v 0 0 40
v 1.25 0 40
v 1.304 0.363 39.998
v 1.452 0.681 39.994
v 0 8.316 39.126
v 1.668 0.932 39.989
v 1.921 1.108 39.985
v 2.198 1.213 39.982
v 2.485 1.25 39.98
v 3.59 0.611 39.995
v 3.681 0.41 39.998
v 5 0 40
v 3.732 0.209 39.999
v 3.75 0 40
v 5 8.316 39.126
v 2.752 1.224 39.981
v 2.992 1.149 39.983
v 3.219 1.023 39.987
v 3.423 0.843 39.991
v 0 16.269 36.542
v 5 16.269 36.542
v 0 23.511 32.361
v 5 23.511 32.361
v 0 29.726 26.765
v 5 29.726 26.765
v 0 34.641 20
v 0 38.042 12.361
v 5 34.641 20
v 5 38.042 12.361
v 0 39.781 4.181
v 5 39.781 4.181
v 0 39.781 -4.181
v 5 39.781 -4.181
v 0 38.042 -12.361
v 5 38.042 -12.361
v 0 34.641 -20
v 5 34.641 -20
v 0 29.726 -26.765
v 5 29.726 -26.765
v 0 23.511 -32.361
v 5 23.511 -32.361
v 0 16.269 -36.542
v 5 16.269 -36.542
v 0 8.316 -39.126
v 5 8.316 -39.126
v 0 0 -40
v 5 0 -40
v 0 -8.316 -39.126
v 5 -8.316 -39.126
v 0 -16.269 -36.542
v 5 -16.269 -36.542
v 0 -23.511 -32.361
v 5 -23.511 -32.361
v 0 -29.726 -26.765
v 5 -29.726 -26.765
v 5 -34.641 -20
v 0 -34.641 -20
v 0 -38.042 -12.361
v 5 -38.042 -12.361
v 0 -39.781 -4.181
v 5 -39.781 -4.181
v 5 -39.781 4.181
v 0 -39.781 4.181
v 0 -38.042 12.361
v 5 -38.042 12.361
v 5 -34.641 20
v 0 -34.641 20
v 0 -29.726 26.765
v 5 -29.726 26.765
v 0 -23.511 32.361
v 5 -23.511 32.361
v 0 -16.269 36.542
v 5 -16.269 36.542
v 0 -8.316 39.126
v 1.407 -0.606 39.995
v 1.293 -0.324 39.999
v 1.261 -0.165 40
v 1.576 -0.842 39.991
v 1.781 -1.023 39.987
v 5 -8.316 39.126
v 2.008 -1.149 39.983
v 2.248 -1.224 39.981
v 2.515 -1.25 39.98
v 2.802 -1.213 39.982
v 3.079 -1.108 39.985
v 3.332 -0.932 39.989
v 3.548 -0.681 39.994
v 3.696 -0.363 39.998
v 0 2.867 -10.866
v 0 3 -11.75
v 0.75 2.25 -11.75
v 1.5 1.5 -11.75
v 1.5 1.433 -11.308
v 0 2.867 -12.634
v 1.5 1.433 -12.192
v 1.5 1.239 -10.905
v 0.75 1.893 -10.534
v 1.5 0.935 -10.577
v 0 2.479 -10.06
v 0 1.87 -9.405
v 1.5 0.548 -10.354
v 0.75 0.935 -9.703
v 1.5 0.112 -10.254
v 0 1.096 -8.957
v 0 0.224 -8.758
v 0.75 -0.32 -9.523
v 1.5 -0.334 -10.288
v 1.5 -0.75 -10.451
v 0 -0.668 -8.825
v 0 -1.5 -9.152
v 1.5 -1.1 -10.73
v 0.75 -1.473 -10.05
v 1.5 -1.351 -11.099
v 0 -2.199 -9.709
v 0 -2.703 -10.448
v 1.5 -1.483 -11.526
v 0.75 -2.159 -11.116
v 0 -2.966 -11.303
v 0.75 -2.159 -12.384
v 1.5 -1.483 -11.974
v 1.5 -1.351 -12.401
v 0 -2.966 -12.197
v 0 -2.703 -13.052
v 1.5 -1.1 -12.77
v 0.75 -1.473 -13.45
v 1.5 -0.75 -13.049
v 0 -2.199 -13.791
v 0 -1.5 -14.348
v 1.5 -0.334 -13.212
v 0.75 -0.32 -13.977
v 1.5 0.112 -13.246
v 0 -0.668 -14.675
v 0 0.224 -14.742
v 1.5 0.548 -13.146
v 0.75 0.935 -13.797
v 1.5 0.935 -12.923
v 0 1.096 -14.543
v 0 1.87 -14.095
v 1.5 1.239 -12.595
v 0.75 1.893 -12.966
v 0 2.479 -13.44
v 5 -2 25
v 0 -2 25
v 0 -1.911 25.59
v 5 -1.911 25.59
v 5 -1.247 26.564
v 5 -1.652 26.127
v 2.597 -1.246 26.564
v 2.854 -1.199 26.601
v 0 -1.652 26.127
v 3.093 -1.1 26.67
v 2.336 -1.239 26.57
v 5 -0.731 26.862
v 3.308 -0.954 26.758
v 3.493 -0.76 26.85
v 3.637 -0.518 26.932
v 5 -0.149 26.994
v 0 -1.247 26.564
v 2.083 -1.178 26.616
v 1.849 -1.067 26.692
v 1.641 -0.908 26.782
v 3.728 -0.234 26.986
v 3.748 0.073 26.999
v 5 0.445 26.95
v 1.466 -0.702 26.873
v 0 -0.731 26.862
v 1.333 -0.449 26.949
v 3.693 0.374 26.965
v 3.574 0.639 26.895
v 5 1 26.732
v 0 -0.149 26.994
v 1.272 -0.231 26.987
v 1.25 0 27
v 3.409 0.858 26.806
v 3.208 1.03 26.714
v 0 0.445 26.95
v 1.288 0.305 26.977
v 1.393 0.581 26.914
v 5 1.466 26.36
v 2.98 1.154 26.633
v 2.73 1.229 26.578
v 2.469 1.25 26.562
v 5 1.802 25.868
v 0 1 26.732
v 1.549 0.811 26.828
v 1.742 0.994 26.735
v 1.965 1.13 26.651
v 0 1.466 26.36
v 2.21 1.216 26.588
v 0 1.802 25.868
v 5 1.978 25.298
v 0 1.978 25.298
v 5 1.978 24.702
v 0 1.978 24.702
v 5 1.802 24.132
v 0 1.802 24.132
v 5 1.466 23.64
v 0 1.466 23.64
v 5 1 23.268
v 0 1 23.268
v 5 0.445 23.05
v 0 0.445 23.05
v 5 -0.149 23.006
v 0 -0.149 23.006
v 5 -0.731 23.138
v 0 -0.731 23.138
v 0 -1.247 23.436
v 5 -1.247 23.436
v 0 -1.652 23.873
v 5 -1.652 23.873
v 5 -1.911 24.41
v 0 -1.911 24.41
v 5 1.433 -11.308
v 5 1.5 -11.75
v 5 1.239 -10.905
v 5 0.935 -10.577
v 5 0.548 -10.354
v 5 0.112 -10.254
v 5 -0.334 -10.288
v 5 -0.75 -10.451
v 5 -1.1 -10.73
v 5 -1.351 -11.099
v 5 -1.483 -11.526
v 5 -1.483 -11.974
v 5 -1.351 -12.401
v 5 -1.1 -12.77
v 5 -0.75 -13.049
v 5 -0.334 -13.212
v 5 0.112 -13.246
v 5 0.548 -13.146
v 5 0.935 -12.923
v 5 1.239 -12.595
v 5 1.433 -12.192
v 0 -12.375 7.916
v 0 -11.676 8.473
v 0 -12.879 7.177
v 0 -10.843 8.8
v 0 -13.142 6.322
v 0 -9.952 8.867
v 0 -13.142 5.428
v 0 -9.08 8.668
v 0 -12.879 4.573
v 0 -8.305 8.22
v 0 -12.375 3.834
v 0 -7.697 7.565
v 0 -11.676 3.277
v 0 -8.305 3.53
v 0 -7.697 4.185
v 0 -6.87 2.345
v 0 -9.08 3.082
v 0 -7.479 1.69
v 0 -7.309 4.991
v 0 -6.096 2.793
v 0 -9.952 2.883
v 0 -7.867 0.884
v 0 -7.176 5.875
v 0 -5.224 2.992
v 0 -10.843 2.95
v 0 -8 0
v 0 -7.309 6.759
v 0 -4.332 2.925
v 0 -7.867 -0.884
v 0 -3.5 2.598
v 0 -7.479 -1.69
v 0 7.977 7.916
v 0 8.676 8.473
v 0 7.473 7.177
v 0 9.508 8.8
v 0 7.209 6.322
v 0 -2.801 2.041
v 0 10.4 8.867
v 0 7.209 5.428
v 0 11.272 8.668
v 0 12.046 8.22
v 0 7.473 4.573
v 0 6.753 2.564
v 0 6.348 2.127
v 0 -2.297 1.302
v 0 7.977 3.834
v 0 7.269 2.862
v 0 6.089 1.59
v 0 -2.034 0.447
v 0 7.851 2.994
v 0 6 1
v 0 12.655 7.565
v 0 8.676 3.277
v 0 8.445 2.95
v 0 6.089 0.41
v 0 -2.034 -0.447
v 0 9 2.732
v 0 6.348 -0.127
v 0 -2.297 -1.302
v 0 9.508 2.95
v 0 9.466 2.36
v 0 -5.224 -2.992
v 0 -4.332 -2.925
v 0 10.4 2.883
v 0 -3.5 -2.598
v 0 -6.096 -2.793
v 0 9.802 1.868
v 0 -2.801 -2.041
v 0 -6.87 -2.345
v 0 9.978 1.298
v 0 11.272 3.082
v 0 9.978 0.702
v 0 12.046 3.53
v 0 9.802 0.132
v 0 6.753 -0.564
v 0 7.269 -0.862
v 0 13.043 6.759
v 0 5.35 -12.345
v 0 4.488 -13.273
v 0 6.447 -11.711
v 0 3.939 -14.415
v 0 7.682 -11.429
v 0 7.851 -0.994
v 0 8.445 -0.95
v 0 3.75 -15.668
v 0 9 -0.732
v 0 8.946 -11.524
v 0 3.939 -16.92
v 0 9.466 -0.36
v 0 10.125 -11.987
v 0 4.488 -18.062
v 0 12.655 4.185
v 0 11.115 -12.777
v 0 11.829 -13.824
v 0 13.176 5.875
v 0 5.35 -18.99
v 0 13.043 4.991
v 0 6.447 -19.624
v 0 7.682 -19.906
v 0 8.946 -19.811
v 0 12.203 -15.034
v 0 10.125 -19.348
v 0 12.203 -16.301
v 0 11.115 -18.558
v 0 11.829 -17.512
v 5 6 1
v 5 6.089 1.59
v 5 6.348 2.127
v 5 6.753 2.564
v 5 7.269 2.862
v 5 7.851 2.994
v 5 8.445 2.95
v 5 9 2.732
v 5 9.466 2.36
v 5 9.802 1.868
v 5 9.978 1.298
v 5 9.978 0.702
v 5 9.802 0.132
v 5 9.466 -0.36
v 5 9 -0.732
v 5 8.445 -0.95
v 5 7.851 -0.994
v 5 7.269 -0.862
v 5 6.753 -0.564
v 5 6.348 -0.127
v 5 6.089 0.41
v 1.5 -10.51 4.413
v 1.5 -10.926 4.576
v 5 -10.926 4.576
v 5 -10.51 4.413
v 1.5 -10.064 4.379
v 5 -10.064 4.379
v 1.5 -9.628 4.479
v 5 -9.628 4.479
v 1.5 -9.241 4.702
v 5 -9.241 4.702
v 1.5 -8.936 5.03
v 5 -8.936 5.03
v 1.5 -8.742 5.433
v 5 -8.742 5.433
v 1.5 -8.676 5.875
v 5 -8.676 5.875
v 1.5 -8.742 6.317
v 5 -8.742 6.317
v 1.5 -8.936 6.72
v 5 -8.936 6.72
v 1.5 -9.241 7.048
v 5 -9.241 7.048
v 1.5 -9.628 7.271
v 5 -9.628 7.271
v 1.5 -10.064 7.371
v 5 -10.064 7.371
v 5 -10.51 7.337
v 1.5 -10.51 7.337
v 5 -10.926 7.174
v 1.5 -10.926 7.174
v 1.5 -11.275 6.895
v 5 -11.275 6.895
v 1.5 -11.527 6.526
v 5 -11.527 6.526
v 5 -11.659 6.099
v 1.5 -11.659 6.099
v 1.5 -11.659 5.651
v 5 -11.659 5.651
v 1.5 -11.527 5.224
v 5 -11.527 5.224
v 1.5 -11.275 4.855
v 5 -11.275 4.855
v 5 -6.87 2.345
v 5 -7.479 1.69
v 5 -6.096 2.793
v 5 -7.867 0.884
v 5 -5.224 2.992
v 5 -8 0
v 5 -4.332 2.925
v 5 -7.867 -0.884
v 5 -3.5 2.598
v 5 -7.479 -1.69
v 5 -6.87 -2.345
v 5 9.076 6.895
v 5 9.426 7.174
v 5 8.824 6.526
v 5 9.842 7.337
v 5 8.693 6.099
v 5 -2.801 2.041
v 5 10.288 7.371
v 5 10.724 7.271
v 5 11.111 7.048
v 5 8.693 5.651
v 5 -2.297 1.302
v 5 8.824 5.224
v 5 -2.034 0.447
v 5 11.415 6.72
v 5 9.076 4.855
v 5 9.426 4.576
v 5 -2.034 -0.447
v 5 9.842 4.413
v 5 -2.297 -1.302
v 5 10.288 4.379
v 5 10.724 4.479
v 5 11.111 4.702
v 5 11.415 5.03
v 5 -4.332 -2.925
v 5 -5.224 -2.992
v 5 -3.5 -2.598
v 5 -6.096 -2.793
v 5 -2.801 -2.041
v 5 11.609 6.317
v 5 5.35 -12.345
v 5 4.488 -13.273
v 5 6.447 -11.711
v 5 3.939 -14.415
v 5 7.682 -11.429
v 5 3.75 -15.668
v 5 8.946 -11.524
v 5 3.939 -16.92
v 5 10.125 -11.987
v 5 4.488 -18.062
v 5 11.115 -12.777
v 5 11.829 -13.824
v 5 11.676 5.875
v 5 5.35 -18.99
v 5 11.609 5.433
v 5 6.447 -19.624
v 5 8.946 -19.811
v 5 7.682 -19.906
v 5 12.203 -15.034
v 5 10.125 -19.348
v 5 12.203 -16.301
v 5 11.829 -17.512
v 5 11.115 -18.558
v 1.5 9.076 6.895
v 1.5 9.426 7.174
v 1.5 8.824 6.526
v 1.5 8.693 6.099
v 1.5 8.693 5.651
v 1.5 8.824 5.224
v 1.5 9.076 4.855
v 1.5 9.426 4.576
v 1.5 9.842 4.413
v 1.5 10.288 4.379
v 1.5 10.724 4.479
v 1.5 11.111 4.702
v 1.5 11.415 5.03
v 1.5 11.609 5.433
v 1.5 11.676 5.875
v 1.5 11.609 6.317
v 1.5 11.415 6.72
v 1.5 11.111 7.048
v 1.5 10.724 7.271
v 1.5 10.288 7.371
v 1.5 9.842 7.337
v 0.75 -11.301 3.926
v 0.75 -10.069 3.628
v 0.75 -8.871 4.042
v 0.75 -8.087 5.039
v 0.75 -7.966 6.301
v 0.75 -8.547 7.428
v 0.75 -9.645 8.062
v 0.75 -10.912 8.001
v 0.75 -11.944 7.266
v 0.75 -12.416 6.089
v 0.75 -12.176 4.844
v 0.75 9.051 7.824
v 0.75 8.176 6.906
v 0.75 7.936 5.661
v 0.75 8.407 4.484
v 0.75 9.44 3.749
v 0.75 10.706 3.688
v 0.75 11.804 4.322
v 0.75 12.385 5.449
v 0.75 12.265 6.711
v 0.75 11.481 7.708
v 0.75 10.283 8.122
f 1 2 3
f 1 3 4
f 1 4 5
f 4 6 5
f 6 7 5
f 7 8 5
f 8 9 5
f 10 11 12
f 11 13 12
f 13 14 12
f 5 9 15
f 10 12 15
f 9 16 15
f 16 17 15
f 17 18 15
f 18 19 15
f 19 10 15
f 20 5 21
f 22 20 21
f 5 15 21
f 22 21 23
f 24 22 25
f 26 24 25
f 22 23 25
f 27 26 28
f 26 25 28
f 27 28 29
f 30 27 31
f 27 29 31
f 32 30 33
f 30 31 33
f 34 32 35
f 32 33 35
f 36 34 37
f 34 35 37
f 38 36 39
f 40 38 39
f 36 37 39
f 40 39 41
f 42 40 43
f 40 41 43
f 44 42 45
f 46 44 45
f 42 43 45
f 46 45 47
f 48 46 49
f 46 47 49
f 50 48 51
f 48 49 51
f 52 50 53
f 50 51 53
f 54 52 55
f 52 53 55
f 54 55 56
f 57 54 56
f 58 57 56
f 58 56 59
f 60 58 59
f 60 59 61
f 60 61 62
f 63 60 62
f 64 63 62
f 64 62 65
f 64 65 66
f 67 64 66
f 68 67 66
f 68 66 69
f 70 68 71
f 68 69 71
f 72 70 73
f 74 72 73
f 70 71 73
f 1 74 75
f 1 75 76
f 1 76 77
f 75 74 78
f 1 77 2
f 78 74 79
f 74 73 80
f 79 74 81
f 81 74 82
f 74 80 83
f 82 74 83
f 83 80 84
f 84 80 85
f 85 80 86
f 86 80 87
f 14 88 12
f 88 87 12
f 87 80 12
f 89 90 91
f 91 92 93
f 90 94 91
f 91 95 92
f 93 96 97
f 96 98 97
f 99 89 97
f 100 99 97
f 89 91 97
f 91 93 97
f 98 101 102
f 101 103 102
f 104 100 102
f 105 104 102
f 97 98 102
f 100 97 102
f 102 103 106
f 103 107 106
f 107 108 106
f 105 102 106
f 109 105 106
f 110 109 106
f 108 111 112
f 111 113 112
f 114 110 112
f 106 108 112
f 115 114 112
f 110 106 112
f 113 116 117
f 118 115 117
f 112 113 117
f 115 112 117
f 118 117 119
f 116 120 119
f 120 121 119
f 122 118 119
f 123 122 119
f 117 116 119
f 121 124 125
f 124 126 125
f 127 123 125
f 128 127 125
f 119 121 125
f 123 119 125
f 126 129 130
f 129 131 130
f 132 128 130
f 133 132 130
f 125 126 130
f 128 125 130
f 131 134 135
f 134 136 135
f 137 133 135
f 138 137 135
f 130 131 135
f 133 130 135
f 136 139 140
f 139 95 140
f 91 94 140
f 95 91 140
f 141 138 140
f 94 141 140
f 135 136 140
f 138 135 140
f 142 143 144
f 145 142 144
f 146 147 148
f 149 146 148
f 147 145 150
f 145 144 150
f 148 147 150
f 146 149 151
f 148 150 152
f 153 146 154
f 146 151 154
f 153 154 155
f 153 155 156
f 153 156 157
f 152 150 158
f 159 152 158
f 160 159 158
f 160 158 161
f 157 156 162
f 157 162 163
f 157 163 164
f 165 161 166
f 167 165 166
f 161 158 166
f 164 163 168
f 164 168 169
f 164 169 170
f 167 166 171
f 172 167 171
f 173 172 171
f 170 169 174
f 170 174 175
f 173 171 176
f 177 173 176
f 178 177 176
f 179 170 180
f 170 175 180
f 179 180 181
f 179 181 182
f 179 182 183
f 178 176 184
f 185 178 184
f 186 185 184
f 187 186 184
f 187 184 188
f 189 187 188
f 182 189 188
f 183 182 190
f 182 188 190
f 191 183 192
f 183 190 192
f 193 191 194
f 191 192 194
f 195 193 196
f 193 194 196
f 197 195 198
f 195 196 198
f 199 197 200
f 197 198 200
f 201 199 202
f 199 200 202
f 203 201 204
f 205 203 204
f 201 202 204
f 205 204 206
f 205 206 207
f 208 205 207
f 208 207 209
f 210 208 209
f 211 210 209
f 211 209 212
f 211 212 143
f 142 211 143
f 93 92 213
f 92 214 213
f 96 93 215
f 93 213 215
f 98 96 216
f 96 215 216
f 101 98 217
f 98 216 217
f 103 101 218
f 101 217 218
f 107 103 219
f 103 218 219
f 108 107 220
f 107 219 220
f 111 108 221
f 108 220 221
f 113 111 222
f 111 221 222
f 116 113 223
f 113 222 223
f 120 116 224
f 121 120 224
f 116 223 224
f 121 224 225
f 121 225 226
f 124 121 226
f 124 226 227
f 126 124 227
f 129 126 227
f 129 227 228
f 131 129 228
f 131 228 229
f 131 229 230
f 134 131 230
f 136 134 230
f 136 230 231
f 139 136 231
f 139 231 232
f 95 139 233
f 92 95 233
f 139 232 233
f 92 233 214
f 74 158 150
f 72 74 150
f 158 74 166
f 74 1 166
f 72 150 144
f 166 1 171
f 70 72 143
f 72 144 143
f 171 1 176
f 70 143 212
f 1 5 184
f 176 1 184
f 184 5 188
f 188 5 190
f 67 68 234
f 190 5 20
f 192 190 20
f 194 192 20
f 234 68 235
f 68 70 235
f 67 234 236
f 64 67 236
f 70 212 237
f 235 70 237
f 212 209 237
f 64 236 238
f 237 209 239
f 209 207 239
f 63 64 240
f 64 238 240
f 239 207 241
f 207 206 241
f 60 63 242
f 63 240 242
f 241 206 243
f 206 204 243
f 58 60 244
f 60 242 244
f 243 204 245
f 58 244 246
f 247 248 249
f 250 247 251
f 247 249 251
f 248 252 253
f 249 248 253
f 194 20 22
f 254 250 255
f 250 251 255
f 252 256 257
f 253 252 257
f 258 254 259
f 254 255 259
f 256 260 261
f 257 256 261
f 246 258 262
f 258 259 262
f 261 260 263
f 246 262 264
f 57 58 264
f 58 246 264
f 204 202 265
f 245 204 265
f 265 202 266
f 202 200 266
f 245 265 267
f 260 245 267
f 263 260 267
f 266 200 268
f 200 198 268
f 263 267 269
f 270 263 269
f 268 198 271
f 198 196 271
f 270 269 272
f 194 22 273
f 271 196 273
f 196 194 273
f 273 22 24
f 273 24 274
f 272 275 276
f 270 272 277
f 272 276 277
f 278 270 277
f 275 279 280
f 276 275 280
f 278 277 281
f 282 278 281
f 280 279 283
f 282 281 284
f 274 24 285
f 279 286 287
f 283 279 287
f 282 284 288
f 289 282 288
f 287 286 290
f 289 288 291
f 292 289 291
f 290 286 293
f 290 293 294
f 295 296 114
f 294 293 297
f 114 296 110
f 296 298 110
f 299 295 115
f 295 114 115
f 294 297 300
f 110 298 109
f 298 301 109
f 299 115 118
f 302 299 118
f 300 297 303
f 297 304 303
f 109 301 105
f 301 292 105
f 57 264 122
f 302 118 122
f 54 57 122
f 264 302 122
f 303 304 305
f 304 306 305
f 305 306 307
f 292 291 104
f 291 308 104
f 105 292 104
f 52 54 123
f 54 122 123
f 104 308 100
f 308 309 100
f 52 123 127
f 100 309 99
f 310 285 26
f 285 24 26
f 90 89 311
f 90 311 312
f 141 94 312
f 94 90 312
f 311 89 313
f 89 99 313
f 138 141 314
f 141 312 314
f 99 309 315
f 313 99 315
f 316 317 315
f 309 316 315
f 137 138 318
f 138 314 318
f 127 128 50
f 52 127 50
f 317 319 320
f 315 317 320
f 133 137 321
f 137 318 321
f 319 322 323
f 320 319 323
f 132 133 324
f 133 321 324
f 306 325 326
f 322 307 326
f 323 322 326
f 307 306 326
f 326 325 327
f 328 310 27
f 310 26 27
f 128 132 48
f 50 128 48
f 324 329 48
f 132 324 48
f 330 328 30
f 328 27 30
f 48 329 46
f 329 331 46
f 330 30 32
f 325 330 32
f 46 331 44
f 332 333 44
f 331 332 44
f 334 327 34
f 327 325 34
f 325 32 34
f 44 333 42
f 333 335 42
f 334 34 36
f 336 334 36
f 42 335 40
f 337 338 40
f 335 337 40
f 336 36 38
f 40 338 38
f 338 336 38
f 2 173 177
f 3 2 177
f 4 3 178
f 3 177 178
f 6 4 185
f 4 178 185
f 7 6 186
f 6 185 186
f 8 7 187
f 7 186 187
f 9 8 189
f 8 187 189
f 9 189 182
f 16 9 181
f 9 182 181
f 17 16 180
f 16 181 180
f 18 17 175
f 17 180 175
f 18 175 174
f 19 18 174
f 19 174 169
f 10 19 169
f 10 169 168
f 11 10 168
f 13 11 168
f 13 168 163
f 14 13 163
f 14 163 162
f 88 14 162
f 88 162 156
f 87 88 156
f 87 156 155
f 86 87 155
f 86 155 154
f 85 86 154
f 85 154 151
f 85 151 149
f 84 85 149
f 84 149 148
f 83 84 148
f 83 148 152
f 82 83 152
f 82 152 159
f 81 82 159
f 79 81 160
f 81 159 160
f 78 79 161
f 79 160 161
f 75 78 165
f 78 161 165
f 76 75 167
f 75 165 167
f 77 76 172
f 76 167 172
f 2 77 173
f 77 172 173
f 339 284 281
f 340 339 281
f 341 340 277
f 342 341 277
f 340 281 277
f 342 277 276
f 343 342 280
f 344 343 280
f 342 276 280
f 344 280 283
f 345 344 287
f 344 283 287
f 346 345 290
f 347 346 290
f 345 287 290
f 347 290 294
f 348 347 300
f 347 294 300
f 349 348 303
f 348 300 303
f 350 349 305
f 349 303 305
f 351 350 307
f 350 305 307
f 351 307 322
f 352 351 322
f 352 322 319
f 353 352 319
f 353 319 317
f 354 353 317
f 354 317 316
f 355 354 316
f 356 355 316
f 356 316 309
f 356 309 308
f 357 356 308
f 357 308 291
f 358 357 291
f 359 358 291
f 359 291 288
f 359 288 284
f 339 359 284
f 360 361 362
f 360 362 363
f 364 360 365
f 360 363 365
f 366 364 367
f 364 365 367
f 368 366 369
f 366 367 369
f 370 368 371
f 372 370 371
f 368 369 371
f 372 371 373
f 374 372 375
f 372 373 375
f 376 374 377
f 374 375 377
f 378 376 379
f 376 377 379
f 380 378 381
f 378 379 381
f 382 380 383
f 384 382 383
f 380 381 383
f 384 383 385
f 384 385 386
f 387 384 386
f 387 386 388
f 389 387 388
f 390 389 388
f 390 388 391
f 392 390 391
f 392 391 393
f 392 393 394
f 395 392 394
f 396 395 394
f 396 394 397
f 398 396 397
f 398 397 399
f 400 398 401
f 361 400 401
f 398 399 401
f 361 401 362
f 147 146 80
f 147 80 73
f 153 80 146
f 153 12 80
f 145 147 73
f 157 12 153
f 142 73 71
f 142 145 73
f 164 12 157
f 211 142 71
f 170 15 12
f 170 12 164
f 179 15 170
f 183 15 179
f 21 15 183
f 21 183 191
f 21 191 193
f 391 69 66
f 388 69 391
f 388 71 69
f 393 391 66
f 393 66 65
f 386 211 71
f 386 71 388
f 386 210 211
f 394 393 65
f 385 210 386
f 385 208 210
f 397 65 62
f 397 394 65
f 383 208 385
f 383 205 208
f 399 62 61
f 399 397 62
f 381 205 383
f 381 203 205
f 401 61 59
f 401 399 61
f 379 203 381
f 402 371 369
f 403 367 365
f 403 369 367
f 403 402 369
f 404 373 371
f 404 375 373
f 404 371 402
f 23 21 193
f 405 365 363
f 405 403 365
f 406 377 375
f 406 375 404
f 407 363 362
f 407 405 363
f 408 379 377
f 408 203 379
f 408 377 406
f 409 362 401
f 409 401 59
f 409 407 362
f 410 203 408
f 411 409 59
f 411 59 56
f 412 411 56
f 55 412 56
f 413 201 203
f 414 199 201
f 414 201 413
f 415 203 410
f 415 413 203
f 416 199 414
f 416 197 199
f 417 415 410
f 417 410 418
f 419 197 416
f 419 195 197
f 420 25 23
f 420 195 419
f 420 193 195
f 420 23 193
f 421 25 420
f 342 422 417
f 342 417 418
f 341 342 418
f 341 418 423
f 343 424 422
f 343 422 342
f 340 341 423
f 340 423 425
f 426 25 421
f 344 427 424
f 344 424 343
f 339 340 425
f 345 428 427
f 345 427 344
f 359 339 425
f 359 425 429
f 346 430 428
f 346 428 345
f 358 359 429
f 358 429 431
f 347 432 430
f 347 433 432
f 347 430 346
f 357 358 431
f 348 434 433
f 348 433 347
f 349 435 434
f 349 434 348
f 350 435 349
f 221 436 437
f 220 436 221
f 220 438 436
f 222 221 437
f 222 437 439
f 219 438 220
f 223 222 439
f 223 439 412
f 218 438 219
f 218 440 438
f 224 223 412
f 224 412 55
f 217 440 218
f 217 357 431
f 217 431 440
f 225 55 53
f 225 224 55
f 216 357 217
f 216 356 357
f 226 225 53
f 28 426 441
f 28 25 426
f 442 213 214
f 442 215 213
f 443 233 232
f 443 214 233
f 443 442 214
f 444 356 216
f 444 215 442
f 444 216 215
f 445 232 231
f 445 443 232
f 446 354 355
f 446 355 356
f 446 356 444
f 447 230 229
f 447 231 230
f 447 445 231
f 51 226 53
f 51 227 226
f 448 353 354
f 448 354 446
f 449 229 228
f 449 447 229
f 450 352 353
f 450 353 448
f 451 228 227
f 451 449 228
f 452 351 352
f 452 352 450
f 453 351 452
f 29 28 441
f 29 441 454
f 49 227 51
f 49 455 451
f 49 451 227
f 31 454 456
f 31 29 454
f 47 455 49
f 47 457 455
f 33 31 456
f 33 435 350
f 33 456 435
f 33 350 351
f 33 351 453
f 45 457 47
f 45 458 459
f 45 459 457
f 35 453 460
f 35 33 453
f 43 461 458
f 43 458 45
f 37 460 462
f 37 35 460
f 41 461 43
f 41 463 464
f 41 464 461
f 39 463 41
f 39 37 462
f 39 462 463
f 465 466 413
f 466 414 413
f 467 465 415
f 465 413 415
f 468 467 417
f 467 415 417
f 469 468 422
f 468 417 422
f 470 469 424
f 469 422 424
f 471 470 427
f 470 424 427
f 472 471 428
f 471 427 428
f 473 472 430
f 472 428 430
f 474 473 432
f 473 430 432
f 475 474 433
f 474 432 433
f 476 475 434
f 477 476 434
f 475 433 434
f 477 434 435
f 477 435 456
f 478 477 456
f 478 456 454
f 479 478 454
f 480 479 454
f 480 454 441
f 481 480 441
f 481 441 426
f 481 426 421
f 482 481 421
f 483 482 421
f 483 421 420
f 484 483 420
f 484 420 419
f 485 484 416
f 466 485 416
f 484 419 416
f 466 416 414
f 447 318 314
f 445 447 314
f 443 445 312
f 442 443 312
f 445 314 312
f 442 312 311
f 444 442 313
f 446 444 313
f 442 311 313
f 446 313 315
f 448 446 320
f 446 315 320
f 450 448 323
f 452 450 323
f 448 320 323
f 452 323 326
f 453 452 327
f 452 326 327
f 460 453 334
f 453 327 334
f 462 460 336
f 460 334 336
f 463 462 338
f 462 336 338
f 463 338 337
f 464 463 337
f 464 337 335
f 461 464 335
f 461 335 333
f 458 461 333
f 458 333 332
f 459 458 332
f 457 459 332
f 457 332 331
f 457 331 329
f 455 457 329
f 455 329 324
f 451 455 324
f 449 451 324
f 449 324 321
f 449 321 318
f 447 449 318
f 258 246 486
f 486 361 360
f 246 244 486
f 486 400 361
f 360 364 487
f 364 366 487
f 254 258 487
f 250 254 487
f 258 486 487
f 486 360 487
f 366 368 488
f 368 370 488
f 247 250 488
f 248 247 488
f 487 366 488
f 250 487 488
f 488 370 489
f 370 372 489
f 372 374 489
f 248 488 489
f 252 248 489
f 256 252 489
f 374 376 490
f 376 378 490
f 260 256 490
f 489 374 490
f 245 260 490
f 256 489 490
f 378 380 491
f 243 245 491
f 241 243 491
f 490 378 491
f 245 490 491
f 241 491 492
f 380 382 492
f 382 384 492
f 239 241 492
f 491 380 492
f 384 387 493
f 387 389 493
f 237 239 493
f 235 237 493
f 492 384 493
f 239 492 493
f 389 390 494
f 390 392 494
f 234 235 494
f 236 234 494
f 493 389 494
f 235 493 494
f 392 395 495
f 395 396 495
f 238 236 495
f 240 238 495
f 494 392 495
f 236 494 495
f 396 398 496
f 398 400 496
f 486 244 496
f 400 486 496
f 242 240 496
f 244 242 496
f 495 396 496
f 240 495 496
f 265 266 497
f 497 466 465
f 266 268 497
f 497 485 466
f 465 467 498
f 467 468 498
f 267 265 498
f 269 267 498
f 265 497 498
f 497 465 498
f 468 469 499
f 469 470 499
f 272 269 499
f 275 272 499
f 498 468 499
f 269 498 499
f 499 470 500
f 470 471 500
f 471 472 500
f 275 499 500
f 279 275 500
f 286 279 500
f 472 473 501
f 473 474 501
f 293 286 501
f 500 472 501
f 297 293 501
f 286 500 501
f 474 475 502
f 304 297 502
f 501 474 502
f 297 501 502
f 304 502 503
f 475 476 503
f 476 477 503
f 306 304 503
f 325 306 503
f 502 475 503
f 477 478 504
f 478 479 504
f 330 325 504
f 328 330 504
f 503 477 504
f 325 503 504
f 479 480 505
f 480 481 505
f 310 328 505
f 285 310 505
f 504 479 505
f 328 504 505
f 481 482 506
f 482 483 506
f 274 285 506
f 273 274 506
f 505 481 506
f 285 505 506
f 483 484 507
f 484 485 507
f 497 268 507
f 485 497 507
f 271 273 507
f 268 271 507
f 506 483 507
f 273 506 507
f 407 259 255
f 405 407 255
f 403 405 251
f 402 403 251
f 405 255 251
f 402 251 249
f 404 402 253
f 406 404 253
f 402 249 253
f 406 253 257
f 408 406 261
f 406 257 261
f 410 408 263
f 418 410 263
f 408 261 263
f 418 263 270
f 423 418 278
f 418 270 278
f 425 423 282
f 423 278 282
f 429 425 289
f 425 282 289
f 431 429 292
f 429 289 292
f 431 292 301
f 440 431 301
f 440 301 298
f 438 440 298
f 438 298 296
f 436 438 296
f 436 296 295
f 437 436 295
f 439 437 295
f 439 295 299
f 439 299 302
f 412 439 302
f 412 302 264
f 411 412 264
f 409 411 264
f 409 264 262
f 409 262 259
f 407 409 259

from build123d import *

# Parameters (mm, degrees)
F0_W            = 5
F0_H            = 40
F3_D            = 4
F4_D            = 4
F5_D            = 6
F6_D            = 8.5
F8_D            = 3
F8_CSINK_D      = 6
F8_CSINK_ANGLE  = 90
F8_COPIES_COUNT = 3
F11_D           = 2.5
F11_DEPTH       = 14.6
F11_START       = 0.0195361
F11_TIP         = 0.7510757738


# Not quite as in the source:
# - a pattern or mirror of a feature is missing from the dataset's text; its kind, count and spacing are read off the source's solid


with BuildPart() as f1:
    # F0 (on Front) → F1 (revolve)
    with BuildSketch(Plane.XZ):
        with Locations((2.5, 20)):
            Rectangle(F0_W, F0_H)
    revolve(axis=Axis((2.5, 0, 0), (-1, 0, 0)))

    # F3 (through all)
    with Locations(Plane.YZ.offset(5)):
        with Locations((8, 1)):
            Hole(F3_D / 2)

    # F4 (through all)
    with Locations(Plane.YZ.offset(5)):
        with Locations((0, 25)):
            Hole(F4_D / 2)

    # F5 (through all)
    with Locations(Plane.YZ.offset(5)):
        with Locations((-5, 0)):
            Hole(F5_D / 2)

    # F6 (through all)
    with Locations(Plane.YZ.offset(5)):
        with Locations((8, -15.6675087226)):
            Hole(F6_D / 2)

    # F8 (through all)
    with Locations(Plane(origin=(0, 0, 0), x_dir=(0, -1, 0), z_dir=(-1, 0, 0))):
        with Locations((0, -11.75)):
            f8 = CounterSinkHole(F8_D / 2, F8_CSINK_D / 2, counter_sink_angle=F8_CSINK_ANGLE)

    # F8_copies: F8 ×3 about axis
    f8_copies_axis = Axis((0, 0, 0), (1, 0, 0))
    for i in range(1, F8_COPIES_COUNT):
        add(f8.rotate(f8_copies_axis, i * 360 / F8_COPIES_COUNT), mode=Mode.SUBTRACT)

    # F11
    # its depths count from where the whole tool has entered the part; down to there all is cleared
    with Locations(Plane.XY.offset(40).offset(-F11_START)):
        with Locations((2.5, 0)):
            Hole(F11_D / 2, depth=F11_DEPTH)
            with Locations((0, 0, -(F11_DEPTH + F11_TIP / 2))):  # 118° drill point
                Cone(0, F11_D / 2, F11_TIP, mode=Mode.SUBTRACT)


solid = f1.part
